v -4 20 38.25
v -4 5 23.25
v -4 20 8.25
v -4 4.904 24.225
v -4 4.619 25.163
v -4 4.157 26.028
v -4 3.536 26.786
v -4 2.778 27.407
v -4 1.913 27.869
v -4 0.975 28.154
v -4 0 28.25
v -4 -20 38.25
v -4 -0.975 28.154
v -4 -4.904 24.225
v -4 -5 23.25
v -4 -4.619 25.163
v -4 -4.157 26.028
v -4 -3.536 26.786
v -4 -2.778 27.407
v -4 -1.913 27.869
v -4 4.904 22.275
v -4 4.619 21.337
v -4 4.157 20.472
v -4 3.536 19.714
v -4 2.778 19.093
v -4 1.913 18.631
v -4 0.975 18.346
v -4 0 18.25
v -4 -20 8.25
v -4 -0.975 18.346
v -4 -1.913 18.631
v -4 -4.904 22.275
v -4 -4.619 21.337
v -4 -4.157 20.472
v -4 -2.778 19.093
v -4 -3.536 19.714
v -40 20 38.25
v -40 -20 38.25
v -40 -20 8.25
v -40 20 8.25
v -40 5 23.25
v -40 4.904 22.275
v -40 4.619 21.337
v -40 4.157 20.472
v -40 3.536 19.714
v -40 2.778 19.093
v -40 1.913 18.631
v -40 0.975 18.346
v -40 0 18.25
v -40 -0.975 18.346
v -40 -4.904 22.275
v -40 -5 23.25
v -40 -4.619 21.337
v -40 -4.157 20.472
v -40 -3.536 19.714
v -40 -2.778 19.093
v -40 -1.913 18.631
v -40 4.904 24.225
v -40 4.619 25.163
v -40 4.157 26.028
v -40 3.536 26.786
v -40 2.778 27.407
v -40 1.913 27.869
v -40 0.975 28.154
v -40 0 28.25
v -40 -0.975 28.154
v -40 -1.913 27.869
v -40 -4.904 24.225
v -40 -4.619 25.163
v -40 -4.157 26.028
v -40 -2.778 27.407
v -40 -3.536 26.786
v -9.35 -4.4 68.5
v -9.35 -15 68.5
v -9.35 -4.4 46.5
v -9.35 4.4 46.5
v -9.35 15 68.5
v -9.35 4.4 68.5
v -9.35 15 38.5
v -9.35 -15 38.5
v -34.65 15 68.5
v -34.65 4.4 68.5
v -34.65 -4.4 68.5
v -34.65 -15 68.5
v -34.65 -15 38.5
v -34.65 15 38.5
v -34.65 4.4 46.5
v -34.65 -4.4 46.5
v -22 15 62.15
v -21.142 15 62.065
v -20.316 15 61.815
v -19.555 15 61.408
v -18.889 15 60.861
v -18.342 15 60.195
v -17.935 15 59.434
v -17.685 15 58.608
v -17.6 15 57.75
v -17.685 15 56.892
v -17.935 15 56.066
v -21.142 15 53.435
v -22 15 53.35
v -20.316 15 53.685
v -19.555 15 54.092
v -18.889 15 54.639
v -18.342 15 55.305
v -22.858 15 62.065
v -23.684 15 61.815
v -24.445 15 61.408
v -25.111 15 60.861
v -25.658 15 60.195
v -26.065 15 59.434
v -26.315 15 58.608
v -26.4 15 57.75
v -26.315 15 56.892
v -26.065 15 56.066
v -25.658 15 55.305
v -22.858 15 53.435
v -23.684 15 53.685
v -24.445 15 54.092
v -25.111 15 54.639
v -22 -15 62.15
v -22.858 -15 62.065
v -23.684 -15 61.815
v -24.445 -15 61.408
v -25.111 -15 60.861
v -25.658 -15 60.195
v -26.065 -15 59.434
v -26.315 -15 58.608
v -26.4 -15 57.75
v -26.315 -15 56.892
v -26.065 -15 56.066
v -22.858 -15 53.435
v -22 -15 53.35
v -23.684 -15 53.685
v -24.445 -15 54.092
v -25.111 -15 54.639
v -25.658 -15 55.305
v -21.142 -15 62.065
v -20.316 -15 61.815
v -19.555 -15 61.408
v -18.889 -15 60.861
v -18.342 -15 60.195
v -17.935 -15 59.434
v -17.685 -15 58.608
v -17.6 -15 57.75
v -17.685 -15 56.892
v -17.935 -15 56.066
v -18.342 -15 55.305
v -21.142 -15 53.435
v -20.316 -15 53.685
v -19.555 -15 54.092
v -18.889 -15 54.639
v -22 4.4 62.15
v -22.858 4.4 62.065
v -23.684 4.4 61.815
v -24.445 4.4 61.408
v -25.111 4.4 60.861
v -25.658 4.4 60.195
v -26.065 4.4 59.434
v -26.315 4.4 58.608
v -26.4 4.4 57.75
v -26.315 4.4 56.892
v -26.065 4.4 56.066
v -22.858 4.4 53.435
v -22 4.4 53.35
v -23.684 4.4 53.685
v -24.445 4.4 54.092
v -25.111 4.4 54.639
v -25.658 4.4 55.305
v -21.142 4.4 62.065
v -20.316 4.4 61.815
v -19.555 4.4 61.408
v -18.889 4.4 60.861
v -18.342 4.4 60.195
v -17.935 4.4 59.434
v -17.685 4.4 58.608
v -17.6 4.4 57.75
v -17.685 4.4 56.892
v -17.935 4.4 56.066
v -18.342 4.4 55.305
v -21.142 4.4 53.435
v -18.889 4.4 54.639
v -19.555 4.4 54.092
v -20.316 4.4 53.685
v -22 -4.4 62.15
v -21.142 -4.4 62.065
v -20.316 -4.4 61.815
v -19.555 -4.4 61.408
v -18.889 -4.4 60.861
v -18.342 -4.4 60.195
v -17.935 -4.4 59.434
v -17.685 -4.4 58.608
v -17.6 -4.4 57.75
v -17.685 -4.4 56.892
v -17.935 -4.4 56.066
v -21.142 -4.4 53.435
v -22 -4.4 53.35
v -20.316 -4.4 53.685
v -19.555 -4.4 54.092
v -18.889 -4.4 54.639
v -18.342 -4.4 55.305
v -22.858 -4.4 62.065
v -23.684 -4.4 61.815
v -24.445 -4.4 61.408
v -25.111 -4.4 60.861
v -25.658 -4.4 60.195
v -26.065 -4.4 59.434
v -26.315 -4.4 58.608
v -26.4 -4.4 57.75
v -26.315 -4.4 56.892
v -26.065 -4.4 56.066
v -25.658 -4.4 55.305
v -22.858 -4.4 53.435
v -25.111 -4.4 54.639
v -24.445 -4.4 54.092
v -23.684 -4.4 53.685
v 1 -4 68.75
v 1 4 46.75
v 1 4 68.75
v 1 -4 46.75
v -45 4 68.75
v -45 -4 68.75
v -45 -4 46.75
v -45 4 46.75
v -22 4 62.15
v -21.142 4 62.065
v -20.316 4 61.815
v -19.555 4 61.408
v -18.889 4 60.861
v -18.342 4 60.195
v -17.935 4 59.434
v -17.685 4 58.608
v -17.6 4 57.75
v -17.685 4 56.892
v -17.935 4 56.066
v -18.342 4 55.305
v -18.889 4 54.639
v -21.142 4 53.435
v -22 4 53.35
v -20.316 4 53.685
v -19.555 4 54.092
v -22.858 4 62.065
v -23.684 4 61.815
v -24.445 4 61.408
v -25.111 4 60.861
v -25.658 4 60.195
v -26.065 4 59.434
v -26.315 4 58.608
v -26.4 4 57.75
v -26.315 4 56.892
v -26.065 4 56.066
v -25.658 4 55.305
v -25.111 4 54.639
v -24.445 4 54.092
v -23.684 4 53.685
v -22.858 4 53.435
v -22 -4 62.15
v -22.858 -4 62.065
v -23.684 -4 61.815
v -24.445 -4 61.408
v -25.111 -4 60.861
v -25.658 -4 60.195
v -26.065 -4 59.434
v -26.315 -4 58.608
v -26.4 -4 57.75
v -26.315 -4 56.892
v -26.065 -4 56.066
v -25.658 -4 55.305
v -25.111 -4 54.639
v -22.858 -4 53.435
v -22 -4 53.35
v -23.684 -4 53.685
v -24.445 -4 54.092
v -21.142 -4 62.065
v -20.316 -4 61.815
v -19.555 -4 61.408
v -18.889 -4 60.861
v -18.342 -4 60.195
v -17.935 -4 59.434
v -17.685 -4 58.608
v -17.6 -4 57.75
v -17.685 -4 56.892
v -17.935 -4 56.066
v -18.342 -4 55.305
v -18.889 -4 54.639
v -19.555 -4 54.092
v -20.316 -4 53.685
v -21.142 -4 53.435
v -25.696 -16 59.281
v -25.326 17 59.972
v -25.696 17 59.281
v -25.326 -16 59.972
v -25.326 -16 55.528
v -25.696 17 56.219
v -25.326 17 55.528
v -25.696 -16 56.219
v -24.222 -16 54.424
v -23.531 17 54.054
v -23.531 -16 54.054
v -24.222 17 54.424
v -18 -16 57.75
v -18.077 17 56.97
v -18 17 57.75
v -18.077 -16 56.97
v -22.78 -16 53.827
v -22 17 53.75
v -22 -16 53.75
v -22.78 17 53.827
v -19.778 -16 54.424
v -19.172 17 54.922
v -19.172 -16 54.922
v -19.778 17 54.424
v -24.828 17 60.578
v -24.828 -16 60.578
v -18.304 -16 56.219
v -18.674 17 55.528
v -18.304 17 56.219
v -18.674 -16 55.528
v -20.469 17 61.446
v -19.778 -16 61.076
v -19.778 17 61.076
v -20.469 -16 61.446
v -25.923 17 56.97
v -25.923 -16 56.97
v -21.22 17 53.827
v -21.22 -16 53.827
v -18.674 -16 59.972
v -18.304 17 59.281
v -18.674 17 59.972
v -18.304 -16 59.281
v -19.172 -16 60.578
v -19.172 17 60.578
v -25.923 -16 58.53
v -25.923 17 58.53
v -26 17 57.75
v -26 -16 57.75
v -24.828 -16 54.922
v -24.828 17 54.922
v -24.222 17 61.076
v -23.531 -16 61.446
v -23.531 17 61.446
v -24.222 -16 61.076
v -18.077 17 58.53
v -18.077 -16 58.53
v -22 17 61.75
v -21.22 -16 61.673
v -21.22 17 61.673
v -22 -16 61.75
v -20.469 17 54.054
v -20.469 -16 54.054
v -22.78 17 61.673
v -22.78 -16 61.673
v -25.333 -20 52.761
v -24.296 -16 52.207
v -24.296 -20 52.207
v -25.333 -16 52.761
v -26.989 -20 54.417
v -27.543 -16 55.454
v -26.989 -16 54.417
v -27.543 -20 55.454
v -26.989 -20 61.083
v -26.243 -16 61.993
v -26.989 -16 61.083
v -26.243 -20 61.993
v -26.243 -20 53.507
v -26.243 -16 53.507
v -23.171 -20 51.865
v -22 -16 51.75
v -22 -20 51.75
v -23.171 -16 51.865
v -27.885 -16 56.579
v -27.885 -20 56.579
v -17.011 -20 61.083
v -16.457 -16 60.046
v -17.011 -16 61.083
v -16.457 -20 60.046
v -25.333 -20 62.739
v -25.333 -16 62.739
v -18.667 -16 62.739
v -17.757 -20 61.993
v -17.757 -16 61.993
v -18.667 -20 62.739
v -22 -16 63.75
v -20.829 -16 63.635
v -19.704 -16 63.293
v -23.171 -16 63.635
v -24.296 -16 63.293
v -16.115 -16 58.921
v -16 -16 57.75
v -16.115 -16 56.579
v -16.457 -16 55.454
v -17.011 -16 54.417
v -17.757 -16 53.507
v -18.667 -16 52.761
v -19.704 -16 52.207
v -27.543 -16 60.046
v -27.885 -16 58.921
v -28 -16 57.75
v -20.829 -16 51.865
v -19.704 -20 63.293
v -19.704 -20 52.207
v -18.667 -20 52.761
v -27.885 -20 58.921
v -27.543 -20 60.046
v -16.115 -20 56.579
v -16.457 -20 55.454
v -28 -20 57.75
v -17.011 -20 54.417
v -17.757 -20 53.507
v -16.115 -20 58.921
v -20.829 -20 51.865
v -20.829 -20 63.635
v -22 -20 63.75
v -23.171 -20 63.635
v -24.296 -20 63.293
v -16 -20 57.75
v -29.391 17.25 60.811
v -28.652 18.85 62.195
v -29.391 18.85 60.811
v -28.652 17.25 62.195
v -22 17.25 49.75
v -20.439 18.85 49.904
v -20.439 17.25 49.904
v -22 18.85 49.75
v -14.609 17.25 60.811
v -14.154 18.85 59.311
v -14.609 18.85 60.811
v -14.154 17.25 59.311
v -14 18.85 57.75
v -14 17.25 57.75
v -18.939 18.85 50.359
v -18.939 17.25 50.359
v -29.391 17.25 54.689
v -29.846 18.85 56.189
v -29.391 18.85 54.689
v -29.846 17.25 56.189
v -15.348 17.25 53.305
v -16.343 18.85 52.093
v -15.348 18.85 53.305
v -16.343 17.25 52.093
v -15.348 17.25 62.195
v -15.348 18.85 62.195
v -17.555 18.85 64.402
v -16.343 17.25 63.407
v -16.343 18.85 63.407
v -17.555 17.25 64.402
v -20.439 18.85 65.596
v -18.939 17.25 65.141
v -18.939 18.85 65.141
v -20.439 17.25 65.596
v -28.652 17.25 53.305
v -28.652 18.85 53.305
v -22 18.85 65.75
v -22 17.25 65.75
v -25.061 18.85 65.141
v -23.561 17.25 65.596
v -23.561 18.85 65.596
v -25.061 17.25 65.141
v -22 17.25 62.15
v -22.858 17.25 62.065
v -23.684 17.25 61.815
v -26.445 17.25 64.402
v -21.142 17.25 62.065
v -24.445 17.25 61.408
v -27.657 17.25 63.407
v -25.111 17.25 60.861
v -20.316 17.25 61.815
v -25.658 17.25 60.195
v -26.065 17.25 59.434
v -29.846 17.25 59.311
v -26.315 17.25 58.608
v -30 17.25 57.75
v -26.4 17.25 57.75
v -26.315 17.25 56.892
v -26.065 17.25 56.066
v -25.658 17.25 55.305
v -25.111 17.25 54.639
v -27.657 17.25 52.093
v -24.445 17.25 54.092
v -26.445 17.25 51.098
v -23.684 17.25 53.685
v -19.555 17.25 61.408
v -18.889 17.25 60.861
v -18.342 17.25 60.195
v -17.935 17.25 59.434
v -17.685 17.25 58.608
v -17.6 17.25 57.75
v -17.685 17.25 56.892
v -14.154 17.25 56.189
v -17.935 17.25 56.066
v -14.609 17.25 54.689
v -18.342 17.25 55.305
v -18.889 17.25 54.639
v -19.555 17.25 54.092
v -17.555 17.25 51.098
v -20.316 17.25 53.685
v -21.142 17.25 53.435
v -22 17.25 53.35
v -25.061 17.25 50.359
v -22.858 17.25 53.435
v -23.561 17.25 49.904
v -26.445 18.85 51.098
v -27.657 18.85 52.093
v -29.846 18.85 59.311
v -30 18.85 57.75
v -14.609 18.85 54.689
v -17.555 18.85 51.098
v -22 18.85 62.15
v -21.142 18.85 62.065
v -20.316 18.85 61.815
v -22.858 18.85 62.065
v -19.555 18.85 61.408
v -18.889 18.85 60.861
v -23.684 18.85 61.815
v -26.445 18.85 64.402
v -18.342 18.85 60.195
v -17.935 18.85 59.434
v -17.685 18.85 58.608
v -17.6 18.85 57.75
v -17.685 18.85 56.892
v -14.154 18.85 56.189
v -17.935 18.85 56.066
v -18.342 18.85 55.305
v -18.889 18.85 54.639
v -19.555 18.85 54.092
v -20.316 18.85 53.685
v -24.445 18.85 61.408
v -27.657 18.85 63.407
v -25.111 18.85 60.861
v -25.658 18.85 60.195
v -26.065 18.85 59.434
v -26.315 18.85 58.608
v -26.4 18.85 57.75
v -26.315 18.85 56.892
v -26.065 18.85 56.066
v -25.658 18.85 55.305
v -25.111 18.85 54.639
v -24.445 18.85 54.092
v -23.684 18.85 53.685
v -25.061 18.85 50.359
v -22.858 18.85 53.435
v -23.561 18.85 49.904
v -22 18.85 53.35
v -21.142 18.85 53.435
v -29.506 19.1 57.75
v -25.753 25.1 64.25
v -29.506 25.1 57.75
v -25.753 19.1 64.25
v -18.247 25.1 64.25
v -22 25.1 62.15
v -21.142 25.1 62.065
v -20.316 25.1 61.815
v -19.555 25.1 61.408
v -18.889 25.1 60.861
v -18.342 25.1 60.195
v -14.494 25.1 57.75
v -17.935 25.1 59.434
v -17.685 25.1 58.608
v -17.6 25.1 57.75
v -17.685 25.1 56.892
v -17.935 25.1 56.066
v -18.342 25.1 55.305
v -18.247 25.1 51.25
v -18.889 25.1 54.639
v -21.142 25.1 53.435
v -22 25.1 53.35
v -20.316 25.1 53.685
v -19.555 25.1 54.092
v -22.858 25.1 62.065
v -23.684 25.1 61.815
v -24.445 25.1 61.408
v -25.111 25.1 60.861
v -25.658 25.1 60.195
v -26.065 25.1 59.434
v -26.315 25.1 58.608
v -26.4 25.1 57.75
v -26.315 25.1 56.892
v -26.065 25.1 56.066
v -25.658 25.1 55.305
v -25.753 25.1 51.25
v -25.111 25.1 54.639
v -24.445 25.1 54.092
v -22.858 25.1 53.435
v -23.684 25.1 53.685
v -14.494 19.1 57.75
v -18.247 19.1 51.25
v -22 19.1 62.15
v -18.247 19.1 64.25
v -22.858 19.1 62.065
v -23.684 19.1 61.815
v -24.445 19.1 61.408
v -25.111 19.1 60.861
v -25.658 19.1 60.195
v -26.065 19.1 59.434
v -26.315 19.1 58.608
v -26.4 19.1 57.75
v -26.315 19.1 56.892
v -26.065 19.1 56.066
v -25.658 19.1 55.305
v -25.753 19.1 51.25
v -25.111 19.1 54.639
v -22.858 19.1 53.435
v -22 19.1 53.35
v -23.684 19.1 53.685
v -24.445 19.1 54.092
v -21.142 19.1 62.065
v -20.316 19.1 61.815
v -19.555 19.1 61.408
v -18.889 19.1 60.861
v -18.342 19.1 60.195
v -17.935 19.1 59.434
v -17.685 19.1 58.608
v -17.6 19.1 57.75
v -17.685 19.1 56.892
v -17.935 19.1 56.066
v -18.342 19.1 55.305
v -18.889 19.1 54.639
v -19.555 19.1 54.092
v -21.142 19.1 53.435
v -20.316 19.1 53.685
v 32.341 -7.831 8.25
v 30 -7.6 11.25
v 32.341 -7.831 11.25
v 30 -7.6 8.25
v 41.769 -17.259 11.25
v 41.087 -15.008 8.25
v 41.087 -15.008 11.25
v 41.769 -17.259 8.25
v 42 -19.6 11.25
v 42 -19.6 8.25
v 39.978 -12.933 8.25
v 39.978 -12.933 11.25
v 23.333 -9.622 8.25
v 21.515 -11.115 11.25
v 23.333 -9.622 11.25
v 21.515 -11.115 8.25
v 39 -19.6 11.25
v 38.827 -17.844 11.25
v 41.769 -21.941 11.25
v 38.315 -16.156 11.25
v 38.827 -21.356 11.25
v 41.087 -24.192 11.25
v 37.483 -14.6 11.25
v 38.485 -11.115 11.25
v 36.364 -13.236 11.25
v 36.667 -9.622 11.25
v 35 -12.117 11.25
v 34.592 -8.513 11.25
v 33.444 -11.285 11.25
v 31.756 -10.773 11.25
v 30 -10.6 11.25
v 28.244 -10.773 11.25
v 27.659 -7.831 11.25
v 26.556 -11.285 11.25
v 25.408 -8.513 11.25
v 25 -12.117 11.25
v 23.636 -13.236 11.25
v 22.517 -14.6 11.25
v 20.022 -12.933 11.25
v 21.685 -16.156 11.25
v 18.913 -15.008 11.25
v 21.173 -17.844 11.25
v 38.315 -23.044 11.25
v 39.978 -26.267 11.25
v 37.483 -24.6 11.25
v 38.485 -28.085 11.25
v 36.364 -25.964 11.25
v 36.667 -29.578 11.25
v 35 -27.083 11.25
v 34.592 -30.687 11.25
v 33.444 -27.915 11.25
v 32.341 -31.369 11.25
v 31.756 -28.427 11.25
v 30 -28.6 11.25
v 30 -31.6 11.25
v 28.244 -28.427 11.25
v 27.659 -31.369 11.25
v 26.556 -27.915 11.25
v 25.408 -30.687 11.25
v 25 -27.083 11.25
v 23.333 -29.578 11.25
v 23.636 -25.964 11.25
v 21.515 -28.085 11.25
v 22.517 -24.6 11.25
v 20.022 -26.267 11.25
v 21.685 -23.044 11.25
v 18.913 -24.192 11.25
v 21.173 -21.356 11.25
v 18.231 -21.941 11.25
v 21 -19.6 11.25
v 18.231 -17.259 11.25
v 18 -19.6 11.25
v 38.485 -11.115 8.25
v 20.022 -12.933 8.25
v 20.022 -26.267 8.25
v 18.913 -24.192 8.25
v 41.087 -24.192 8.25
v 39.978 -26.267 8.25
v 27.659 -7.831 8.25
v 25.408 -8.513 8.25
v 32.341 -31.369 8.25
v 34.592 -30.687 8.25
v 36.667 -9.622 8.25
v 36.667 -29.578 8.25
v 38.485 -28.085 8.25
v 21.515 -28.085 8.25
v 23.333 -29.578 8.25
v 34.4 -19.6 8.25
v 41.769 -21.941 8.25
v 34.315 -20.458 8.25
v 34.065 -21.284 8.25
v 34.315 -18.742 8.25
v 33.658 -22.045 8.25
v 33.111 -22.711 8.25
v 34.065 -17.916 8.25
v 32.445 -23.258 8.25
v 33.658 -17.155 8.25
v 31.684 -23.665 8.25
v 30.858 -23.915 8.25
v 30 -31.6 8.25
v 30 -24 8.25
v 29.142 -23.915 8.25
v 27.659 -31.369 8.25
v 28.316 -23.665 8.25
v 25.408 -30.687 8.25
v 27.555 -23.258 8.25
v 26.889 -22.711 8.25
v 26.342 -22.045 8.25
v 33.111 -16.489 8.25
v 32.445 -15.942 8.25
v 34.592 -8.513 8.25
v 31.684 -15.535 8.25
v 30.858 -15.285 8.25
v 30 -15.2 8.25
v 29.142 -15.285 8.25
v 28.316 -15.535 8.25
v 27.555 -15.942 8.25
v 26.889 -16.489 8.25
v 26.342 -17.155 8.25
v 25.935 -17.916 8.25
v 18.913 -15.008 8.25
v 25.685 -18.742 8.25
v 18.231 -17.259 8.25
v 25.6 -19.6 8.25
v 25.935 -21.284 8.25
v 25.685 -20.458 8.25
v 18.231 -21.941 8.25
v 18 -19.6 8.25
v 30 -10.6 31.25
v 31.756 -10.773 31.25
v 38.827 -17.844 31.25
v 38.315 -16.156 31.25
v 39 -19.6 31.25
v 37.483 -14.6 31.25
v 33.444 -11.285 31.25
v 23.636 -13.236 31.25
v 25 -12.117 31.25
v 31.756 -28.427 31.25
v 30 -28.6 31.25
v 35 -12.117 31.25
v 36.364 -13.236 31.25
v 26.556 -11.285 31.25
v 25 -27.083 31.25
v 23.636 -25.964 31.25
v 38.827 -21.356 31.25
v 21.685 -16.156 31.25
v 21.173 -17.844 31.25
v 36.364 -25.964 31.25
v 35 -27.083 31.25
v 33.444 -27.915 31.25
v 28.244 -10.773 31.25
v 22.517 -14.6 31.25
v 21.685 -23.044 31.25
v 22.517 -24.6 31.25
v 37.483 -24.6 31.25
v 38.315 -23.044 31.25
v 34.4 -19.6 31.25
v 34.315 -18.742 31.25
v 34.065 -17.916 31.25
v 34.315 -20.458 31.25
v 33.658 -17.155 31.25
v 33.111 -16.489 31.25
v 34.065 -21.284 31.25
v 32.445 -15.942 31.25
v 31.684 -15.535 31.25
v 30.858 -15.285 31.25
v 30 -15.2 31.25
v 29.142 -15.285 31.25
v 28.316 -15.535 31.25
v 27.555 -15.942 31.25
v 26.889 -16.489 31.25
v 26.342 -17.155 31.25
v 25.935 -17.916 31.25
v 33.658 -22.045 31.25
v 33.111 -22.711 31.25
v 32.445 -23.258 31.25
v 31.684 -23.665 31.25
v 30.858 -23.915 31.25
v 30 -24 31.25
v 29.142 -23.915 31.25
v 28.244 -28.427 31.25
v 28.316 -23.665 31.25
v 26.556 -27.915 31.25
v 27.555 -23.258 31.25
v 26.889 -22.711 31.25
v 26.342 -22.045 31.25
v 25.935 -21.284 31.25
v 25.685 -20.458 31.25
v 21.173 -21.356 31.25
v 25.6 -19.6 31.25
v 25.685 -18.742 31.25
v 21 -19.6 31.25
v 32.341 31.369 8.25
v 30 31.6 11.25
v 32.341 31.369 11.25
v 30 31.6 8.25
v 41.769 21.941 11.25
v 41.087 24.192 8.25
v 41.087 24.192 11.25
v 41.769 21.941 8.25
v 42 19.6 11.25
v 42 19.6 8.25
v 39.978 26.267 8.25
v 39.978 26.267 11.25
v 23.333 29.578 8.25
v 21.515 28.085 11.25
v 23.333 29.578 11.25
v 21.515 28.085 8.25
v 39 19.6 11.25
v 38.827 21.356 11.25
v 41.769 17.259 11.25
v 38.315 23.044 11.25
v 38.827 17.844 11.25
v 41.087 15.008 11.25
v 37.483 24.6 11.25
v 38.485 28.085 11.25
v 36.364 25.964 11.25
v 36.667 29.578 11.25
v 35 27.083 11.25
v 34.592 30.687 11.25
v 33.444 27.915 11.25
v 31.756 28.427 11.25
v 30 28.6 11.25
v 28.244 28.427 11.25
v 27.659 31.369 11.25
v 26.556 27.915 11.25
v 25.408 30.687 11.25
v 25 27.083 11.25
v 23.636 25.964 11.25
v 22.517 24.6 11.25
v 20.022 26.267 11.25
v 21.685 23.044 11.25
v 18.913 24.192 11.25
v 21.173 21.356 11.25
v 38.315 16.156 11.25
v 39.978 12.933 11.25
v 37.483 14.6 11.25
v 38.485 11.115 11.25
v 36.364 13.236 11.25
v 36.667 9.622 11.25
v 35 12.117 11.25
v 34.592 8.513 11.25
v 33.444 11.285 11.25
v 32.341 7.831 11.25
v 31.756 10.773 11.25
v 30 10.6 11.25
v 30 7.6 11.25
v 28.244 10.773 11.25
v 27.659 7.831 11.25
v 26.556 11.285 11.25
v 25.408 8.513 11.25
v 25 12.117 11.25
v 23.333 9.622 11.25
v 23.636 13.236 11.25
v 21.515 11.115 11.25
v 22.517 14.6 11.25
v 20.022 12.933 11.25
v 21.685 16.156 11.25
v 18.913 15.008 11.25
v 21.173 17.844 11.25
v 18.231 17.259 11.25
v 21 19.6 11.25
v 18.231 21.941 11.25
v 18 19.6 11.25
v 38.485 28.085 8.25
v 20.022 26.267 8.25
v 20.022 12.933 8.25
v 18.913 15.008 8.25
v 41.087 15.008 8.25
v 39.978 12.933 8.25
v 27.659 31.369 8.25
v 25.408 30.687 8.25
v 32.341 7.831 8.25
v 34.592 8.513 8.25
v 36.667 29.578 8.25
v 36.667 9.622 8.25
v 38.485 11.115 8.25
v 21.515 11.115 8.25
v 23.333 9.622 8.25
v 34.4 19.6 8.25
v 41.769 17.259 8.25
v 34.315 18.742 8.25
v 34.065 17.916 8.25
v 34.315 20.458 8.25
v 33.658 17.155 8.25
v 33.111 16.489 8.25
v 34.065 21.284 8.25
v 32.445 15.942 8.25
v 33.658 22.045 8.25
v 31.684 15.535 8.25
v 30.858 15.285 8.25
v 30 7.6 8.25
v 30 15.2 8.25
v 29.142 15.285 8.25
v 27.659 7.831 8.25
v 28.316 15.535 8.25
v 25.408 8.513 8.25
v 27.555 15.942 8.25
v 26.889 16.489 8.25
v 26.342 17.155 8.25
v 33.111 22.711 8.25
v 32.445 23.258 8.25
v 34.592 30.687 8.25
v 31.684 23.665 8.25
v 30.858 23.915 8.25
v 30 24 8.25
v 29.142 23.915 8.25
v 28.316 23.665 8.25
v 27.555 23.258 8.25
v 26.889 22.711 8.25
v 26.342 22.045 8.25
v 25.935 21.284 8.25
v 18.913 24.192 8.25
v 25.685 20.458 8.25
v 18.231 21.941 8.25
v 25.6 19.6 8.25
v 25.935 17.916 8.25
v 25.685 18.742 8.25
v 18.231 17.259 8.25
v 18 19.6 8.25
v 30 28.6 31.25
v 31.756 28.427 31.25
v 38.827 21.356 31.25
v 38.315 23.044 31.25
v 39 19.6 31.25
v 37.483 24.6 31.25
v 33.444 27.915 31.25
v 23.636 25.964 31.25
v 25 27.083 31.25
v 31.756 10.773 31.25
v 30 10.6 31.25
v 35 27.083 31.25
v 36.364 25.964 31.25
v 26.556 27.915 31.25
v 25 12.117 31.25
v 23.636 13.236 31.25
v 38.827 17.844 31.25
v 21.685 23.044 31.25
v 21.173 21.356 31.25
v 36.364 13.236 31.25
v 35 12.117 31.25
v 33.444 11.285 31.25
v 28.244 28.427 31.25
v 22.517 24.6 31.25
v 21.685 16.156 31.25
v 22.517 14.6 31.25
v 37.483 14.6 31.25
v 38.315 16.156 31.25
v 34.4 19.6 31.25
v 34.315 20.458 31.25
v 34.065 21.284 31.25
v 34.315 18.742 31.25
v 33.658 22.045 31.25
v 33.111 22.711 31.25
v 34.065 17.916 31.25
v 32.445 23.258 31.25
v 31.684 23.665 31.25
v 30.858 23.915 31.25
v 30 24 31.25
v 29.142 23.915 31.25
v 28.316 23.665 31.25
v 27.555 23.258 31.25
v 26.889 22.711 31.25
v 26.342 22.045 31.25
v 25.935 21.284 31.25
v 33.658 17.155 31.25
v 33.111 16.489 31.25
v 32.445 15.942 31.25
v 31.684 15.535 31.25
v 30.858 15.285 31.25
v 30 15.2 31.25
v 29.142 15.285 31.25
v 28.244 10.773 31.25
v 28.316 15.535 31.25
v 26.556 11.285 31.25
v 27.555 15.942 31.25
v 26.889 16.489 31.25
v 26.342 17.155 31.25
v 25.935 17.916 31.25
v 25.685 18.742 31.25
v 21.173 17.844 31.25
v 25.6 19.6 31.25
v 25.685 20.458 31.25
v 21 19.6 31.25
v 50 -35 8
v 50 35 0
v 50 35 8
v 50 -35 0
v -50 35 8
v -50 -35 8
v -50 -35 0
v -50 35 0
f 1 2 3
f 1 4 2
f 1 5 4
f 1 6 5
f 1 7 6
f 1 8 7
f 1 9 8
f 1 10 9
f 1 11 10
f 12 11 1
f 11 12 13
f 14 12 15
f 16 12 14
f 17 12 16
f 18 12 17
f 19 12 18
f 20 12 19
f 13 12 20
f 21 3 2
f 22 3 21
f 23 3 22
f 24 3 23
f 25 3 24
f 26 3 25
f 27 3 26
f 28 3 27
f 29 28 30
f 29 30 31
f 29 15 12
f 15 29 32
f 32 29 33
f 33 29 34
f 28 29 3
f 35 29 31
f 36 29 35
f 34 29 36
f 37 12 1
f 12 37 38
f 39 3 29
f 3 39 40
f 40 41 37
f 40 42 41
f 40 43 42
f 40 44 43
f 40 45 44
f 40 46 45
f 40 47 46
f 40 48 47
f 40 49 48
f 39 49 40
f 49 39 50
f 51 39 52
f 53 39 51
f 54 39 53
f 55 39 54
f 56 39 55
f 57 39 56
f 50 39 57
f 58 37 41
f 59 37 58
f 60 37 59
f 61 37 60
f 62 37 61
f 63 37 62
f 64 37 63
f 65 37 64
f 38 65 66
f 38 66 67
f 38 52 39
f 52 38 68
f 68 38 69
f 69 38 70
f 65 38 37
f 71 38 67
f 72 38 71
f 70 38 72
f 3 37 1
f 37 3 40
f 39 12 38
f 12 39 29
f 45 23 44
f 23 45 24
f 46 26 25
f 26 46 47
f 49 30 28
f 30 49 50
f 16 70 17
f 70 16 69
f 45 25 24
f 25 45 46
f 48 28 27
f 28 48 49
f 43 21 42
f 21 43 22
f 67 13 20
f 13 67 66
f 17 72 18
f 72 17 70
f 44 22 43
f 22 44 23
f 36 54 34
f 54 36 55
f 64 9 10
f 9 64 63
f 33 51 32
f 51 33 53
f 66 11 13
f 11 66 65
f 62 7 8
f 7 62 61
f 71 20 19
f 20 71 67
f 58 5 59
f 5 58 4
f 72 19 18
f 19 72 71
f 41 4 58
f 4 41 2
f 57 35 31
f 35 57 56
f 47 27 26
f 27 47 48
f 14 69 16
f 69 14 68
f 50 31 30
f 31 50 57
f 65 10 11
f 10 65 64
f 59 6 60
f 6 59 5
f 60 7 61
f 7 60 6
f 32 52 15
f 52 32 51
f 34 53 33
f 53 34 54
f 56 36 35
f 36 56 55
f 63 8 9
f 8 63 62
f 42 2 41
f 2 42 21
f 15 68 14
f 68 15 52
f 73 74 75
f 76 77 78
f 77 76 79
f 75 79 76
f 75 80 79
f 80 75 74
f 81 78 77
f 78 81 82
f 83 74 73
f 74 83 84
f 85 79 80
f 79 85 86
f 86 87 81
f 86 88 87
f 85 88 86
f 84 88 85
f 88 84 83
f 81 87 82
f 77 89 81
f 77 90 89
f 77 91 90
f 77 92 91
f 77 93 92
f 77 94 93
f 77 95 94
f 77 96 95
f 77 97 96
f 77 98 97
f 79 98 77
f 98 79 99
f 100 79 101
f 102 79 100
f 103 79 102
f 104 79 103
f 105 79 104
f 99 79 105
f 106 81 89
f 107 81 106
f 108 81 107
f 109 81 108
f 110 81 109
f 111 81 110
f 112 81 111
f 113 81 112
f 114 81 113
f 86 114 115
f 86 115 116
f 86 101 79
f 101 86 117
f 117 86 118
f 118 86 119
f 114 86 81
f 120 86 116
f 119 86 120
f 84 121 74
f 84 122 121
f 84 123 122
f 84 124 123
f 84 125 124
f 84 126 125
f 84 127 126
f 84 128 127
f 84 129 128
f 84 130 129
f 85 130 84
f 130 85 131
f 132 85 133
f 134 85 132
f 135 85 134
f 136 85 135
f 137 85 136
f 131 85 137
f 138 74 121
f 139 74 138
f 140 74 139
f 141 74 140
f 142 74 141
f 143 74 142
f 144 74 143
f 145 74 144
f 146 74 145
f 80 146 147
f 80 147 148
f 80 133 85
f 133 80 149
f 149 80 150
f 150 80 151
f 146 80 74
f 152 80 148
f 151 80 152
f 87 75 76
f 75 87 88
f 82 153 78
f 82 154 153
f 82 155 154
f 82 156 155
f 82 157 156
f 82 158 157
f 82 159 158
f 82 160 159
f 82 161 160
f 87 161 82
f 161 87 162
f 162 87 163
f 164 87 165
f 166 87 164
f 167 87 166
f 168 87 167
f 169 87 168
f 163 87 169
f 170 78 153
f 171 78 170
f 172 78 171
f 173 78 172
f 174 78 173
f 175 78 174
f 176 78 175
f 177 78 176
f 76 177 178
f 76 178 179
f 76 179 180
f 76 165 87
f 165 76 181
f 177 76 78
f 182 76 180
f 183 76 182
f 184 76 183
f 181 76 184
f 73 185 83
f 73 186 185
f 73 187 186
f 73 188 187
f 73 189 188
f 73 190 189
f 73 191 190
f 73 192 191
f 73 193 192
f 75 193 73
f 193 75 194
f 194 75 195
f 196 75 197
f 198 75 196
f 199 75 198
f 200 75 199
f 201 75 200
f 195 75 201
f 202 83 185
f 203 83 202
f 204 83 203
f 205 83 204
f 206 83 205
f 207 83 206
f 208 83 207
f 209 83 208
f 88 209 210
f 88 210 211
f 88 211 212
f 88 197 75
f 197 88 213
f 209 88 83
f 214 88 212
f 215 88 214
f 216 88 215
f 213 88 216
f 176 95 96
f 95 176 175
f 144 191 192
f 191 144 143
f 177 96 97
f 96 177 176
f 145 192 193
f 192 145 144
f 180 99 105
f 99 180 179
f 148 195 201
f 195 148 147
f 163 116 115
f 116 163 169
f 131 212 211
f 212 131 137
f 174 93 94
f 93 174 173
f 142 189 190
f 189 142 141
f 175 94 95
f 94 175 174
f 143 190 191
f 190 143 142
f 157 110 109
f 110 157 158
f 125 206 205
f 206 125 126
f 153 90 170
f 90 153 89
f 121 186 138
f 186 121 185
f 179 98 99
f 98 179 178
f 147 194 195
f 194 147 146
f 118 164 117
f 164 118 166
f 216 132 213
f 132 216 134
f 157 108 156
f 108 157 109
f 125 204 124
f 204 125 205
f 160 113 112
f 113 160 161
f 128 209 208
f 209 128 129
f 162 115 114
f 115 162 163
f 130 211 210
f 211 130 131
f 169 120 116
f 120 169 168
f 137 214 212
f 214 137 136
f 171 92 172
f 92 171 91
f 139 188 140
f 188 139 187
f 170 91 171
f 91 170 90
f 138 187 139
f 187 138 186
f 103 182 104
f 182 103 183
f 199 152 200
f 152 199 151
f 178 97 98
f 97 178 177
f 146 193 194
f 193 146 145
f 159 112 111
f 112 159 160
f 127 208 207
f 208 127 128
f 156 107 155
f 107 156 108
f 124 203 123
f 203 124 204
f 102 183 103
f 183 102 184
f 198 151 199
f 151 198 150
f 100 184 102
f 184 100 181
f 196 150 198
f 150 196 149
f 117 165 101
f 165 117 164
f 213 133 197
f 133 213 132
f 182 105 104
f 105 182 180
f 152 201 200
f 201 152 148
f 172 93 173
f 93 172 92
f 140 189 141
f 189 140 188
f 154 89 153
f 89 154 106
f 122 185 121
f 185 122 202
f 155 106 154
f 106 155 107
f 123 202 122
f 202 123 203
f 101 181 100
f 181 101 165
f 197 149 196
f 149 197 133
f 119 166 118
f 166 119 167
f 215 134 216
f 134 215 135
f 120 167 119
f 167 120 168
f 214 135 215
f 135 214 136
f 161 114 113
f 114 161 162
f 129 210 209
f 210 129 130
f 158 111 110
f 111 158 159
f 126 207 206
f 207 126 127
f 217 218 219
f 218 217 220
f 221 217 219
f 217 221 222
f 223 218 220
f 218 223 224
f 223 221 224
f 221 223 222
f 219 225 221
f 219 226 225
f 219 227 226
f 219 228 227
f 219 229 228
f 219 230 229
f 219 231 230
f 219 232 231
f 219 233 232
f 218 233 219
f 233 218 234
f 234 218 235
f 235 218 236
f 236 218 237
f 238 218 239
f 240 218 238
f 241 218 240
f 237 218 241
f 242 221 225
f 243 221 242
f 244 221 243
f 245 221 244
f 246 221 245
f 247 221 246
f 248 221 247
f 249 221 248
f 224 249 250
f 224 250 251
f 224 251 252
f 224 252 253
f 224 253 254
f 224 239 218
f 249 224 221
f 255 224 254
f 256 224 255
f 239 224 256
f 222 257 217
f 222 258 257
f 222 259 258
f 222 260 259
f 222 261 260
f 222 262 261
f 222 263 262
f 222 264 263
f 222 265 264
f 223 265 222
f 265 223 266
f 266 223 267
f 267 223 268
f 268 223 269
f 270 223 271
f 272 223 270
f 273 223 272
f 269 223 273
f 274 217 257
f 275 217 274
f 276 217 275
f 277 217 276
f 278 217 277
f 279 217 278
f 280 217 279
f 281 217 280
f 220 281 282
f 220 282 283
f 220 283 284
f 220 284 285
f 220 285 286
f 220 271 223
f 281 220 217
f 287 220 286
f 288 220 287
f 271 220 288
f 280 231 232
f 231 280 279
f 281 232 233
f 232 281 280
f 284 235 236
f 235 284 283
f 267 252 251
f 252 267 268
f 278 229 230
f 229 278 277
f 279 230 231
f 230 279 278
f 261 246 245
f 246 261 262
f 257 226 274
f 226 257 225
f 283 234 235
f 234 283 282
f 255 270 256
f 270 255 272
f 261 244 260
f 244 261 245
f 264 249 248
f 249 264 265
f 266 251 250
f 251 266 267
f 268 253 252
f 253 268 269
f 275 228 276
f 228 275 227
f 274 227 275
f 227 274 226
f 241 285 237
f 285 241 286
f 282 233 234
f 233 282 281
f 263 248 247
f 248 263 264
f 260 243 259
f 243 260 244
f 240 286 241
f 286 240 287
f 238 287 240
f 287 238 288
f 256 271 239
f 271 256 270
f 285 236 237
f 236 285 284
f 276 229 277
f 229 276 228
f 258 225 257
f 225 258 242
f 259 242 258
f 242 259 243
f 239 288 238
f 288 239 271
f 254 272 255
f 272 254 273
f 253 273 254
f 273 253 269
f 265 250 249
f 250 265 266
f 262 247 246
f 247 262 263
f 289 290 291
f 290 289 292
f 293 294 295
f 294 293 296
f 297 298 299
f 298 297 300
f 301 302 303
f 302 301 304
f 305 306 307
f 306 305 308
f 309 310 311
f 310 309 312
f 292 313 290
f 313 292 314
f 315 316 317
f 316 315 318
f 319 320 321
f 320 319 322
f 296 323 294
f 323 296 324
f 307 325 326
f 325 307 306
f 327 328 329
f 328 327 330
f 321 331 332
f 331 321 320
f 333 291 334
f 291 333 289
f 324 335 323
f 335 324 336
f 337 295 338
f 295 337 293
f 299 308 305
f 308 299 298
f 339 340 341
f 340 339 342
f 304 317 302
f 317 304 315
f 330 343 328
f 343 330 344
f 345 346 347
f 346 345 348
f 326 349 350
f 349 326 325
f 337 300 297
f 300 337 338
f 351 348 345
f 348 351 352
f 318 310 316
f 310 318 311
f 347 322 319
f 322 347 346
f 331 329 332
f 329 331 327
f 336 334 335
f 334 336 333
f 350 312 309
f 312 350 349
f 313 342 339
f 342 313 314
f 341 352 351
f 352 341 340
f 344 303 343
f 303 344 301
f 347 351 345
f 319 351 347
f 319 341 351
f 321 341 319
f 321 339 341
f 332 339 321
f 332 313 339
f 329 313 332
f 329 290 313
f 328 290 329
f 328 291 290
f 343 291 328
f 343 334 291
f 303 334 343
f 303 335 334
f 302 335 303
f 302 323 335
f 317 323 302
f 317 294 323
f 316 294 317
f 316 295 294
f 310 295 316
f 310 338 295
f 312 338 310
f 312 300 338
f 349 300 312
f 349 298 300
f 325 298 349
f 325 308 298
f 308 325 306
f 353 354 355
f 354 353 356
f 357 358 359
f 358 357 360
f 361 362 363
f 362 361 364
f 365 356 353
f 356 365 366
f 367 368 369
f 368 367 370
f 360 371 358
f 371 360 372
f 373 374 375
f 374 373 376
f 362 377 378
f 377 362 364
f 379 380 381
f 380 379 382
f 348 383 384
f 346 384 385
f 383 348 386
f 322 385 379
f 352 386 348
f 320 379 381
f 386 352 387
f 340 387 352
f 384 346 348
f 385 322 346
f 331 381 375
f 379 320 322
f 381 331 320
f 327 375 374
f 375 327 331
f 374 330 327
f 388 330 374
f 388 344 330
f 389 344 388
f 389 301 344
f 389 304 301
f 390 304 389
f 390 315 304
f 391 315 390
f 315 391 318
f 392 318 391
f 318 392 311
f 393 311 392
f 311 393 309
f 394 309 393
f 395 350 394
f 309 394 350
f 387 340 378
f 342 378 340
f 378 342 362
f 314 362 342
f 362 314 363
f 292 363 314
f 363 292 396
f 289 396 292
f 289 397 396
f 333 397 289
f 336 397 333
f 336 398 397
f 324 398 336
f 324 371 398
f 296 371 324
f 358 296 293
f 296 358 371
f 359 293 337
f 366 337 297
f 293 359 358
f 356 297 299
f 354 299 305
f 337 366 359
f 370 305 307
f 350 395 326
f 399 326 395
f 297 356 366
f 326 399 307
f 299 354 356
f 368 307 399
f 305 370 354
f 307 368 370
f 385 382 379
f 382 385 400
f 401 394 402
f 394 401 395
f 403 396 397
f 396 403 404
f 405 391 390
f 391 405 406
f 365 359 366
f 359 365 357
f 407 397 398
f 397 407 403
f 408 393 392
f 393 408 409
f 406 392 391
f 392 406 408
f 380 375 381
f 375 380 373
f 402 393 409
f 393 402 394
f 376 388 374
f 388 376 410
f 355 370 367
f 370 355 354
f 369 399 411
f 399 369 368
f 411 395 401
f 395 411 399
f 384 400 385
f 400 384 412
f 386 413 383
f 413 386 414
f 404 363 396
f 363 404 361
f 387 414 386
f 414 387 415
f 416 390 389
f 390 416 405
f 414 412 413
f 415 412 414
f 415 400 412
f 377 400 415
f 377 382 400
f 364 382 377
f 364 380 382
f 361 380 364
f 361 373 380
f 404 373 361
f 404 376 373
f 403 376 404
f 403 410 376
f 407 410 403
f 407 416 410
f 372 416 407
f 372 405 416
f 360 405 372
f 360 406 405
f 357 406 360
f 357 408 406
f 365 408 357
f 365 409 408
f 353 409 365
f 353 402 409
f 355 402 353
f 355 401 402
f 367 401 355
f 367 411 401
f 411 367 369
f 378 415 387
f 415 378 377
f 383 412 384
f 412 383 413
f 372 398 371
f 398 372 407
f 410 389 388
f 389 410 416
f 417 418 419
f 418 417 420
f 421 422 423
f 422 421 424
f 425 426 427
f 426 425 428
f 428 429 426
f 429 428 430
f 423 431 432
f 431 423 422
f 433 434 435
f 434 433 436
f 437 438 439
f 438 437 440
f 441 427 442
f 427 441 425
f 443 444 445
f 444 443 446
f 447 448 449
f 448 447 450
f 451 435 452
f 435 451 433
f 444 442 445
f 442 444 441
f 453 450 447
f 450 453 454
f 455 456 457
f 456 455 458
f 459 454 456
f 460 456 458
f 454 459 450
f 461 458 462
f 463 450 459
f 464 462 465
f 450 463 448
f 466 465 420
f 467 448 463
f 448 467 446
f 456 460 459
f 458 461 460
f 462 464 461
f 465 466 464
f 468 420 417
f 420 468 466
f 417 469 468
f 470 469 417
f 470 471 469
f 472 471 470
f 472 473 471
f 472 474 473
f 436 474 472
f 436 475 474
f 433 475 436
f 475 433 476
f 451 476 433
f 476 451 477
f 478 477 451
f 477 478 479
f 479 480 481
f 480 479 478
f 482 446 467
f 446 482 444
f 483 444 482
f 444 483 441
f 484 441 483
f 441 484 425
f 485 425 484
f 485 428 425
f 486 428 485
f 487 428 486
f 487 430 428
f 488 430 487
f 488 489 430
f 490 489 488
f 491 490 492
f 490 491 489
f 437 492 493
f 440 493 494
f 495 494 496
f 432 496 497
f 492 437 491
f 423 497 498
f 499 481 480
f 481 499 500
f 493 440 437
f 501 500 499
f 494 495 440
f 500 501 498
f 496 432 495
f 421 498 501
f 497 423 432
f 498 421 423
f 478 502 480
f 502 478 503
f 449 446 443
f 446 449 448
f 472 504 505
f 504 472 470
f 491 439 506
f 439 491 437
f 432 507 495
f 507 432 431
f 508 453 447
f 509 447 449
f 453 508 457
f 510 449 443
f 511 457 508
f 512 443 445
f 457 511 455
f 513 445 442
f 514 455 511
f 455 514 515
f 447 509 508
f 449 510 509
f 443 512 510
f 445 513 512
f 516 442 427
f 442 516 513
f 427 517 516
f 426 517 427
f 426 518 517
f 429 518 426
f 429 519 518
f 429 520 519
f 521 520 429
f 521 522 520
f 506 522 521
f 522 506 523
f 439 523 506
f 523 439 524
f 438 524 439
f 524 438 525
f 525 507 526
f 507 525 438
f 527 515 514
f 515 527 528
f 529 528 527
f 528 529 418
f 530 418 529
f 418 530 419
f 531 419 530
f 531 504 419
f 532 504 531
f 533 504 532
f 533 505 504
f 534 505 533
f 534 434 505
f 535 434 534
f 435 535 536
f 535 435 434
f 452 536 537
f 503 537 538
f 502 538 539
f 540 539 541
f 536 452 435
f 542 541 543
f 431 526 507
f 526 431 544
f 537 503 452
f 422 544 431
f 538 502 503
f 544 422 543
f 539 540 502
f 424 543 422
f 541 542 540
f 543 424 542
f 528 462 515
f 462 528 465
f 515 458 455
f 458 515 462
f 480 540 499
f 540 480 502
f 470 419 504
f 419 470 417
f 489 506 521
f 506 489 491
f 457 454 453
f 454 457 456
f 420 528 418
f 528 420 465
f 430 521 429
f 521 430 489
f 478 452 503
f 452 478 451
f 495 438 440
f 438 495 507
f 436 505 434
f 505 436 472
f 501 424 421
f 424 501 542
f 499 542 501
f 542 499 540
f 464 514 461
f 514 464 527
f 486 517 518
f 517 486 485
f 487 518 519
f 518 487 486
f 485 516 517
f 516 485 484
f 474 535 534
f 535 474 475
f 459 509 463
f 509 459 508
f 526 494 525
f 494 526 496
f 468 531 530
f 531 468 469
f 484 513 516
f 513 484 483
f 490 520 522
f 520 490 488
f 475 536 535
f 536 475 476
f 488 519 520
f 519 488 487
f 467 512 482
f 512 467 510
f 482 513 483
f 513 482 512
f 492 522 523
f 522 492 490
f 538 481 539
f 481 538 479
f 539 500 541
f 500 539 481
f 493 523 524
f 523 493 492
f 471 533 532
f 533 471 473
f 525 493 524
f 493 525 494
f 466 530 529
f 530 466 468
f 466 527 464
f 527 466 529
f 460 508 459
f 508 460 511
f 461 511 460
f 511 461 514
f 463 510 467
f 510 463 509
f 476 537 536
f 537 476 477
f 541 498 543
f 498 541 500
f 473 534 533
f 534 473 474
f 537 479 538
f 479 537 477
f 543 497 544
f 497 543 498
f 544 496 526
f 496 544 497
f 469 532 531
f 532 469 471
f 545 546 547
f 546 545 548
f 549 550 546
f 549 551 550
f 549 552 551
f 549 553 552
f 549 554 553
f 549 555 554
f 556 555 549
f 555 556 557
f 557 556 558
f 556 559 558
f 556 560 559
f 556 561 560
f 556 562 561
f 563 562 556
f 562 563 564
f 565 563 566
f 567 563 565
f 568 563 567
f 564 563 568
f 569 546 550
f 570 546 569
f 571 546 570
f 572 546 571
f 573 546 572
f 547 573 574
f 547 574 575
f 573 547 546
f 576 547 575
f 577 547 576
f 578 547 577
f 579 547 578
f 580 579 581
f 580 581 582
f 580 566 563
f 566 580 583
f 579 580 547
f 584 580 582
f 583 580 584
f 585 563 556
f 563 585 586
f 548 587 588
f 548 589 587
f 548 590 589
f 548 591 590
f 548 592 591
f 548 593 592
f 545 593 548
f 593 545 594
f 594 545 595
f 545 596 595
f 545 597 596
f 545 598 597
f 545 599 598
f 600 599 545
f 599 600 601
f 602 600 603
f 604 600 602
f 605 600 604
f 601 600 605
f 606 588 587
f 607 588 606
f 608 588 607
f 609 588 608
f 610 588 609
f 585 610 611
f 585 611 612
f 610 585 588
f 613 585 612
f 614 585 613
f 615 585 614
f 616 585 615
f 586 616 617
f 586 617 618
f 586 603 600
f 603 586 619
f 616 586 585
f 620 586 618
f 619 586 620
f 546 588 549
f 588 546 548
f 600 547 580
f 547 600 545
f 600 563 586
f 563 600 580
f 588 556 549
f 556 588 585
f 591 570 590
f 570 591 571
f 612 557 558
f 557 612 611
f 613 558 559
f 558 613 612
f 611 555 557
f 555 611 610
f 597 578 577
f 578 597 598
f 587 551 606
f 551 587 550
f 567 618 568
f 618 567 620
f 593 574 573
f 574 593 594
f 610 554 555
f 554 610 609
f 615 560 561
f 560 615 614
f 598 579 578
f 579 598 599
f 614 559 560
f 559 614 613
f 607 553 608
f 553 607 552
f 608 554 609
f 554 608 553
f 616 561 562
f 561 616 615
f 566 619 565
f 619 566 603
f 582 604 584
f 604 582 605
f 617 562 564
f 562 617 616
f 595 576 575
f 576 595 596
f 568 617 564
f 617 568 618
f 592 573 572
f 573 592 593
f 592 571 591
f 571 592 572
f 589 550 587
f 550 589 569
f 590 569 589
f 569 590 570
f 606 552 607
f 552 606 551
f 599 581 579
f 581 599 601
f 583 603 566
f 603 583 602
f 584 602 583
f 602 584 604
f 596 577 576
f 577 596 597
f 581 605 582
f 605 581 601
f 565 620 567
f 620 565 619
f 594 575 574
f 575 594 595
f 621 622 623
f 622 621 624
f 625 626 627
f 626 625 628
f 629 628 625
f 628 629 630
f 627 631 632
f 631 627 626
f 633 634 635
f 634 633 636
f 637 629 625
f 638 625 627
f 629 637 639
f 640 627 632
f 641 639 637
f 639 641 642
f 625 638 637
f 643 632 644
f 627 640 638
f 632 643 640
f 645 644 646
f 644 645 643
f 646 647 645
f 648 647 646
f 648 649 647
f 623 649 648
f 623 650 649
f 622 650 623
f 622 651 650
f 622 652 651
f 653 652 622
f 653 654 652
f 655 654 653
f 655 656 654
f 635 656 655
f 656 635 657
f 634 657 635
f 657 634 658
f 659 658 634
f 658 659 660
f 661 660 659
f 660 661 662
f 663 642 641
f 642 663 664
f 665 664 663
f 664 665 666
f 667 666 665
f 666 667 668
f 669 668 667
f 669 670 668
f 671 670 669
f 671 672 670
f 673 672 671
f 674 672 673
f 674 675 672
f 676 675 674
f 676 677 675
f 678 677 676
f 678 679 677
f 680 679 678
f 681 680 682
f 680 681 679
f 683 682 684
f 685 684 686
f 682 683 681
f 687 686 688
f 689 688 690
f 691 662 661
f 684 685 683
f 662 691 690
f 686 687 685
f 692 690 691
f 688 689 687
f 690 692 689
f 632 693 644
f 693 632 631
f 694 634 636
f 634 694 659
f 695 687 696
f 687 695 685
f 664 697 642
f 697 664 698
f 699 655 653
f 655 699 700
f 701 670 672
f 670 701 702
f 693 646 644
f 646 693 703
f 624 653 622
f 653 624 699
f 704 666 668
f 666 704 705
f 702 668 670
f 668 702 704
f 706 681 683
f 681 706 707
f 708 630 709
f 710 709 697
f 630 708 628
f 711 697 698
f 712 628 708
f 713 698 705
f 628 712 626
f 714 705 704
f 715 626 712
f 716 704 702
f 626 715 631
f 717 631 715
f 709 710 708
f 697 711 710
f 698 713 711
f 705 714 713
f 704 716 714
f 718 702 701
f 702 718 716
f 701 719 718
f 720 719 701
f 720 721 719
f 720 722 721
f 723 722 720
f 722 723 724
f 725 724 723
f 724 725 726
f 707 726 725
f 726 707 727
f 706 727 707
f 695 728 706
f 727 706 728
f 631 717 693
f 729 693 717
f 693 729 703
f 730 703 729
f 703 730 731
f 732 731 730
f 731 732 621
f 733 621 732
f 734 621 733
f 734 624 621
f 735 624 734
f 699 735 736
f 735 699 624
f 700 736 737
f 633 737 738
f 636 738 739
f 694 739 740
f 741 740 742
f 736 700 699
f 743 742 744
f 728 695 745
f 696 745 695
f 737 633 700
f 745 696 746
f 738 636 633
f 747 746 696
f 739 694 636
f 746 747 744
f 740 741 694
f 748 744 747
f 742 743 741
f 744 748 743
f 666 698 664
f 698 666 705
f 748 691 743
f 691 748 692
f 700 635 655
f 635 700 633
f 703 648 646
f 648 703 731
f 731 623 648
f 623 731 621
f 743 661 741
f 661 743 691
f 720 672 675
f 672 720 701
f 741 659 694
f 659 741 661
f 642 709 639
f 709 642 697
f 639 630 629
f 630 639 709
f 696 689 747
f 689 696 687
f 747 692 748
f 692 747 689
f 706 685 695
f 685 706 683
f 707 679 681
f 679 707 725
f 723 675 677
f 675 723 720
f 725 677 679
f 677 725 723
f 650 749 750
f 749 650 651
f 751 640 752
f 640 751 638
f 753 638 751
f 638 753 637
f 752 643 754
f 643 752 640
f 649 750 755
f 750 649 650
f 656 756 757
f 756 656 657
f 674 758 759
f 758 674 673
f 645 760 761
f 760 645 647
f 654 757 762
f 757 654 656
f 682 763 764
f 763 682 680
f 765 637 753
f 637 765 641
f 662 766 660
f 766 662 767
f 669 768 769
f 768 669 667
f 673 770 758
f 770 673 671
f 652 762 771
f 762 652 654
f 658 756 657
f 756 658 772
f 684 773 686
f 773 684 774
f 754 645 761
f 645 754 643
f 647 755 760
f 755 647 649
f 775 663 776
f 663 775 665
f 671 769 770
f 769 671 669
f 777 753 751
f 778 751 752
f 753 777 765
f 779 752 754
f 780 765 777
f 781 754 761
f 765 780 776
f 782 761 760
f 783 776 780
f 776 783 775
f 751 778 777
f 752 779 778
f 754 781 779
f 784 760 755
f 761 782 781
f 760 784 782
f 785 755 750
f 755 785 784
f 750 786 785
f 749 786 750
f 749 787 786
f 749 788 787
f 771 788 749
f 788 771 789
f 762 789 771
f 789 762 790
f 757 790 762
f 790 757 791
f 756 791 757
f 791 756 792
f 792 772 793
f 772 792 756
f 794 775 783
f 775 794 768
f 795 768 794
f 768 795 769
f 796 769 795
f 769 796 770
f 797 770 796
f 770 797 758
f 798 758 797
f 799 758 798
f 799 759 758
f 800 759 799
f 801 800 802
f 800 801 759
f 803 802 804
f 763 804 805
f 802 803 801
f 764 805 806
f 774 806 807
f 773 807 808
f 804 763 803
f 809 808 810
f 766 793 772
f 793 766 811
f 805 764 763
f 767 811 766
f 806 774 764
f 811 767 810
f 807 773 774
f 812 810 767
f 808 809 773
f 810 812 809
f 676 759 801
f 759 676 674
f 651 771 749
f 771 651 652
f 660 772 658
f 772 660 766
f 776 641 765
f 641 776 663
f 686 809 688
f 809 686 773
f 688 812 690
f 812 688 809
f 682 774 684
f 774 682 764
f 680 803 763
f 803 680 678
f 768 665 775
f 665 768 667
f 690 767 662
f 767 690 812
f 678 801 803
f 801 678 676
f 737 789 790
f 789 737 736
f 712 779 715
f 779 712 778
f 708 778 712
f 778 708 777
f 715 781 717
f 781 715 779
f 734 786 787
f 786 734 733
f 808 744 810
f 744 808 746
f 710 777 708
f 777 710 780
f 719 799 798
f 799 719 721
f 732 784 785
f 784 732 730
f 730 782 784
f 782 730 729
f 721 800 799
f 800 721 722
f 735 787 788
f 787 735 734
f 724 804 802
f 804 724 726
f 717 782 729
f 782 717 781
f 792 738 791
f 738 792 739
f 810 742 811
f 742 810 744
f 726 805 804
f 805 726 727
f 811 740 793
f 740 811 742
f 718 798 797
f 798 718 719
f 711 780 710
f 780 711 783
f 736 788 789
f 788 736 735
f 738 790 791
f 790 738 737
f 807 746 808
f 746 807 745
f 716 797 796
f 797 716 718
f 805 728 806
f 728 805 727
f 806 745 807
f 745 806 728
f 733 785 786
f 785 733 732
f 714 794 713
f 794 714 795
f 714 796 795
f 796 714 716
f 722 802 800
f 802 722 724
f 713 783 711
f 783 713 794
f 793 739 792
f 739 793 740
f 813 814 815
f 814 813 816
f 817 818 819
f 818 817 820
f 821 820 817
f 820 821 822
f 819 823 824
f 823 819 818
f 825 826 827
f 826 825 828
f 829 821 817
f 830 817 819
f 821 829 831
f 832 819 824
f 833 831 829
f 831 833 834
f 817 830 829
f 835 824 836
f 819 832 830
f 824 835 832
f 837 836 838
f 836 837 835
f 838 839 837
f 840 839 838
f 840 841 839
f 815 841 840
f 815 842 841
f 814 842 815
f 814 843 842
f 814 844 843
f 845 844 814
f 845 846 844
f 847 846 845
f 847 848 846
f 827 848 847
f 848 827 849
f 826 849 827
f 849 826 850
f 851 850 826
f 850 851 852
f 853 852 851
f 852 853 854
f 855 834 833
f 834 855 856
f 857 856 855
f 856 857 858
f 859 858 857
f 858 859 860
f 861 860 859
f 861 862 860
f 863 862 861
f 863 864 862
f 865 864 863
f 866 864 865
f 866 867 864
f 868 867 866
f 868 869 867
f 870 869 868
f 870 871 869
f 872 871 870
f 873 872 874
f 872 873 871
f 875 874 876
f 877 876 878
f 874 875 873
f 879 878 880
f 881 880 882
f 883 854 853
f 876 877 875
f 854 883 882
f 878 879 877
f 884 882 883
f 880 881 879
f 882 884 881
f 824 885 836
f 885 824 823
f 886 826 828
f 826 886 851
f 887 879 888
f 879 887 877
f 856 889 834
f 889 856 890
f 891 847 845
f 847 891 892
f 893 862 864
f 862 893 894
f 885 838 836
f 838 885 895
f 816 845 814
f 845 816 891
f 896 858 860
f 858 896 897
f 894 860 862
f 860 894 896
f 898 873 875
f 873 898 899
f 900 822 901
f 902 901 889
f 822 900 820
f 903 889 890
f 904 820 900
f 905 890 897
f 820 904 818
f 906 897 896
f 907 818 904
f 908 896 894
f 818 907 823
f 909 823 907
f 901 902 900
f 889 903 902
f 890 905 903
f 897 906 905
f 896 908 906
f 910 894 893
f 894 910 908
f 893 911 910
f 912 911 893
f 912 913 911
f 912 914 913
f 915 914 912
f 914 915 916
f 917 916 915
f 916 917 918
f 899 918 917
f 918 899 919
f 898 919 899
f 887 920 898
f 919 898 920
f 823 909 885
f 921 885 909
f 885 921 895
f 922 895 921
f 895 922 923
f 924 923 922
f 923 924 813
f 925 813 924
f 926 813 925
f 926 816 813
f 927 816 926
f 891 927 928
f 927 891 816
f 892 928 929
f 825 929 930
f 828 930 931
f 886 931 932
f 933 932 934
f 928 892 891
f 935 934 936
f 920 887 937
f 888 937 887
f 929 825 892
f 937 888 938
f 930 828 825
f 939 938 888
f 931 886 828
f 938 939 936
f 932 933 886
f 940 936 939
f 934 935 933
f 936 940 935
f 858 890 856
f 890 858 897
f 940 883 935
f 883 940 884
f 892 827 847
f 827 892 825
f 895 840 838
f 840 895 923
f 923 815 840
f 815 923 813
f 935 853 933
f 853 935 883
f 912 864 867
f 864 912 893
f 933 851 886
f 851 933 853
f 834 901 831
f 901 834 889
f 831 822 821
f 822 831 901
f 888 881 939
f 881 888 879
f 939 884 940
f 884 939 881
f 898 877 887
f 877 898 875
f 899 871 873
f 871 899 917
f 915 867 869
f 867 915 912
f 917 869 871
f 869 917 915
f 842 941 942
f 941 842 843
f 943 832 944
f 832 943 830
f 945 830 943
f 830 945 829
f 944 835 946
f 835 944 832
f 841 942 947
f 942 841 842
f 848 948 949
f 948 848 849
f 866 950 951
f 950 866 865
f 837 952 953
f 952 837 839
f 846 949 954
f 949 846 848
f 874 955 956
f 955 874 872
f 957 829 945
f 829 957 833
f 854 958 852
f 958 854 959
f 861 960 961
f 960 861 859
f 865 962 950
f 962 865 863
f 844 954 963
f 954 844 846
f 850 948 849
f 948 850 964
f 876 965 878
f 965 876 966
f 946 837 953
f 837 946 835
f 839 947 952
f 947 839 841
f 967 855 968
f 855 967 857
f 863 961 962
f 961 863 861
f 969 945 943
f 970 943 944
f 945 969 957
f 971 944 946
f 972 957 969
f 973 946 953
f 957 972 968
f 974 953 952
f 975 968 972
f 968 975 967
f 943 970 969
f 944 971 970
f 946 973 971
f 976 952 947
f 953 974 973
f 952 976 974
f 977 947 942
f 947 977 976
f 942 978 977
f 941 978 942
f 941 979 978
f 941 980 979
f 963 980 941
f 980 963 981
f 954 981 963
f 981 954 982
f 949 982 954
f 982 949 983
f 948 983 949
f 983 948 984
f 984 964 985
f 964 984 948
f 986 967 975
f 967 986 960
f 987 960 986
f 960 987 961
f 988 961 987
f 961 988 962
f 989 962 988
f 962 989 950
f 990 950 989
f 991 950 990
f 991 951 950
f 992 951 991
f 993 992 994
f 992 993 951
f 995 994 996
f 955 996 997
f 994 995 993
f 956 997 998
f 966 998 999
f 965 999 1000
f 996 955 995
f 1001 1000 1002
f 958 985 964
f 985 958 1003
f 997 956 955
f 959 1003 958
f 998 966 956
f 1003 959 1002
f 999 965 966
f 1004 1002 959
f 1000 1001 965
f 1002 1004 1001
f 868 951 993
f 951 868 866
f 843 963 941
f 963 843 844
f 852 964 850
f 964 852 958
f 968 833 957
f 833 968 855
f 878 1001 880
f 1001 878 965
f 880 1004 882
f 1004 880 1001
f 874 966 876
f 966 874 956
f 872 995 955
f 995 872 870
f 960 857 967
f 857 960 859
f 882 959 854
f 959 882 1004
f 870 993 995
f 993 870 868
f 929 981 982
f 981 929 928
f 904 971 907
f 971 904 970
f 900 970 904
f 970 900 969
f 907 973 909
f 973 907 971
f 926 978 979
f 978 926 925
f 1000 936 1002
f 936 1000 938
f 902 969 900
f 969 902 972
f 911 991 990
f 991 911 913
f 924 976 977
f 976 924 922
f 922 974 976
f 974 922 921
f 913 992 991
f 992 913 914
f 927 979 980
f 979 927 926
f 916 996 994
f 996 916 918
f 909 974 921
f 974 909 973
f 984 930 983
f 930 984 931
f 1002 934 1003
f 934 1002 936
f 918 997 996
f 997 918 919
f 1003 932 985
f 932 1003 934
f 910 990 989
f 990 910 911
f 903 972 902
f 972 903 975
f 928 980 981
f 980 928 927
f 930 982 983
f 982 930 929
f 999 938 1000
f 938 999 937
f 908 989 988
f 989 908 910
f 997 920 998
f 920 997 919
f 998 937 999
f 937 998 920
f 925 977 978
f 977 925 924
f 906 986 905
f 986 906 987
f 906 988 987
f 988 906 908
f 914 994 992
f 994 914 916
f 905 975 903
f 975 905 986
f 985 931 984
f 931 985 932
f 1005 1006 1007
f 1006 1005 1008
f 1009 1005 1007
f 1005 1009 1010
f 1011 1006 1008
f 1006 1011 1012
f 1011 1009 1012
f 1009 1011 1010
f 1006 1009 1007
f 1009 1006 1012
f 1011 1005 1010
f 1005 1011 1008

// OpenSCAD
$fn = 32;

// ------------------------------------------------------------------------
// Indexing jig: plate 100 x 70 mm, pin d8
// Every part is its own module, assembly() places every instance.
// ------------------------------------------------------------------------

// --- part 1 ---
module jig_plate() {
  difference() {
    translate([-50, -35, 0]) cube([100, 70, 8]);
  }
}

// --- part 2 ---
module locator_block() {
  difference() {
    translate([-18, -20, 0]) cube([36, 40, 30]);
    translate([0, 0, 15]) rotate([0, 90, 0]) cylinder(h = 38, d = 10, center = true);
  }
}

// --- part 3 ---
module index_fork() {
  difference() {
    translate([-12.65, -15, 0]) cube([25.3, 30, 30]);
    translate([-13.65, -4.4, 8]) cube([27.3, 8.8, 23]);
    translate([0, 0, 19.25]) rotate([90, 0, 0]) cylinder(h = 32, d = 8.8, center = true);
  }
}

// --- part 4 ---
module index_arm() {
  difference() {
    translate([-23, -4, 0]) cube([46, 8, 22]);
    translate([0, 0, 11]) rotate([90, 0, 0]) cylinder(h = 10, d = 8.8, center = true);
  }
}

// --- part 5 ---
module index_pin() {
  rotate([0, 90, 0]) cylinder(h = 34, d = 8, center = true);
  translate([-20, 0, 0]) rotate([0, 90, 0]) cylinder(h = 4, d = 12);
}

// --- part 6 ---
module pin_washer() {
  difference() {
      translate([0, 0, 0]) cylinder(h = 1.6, d = 16);
      translate([0, 0, -1]) cylinder(h = 3.6, d = 8.8);
    }
}

// --- part 7 ---
module lock_nut() {
  difference() {
    linear_extrude(height = 6) polygon(points = [[7.506, 0], [3.753, 6.5], [-3.753, 6.5], [-7.506, 0], [-3.753, -6.5], [3.753, -6.5]]);
    translate([0, 0, -1]) cylinder(h = 8, d = 8.8);
  }
}

// --- part 8 ---
module guide_bush_a() {
  difference() {
    union() {
      cylinder(h = 3, d = 24);
      translate([0, 0, 3]) cylinder(h = 20, d = 18);
    }
    translate([0, 0, -1]) cylinder(h = 25, d = 8.8);
  }
}

// --- part 9 ---
module guide_bush_b() {
  difference() {
    union() {
      cylinder(h = 3, d = 24);
      translate([0, 0, 3]) cylinder(h = 20, d = 18);
    }
    translate([0, 0, -1]) cylinder(h = 25, d = 8.8);
  }
}

// --- assembly ---
module assembly() {
  color([0.80, 0.24, 0.20]) translate([0, 0, 0]) rotate([0, 0, 0]) jig_plate();
  color([0.20, 0.45, 0.75]) translate([-22, 0, 8.25]) rotate([0, 0, 0]) locator_block();
  color([0.25, 0.62, 0.32]) translate([-22, 0, 38.5]) rotate([0, 0, 0]) index_fork();
  color([0.92, 0.70, 0.18]) translate([-22, 0, 46.75]) rotate([0, 0, 0]) index_arm();
  color([0.58, 0.35, 0.70]) translate([-22, 0, 57.75]) rotate([0, 0, 90]) index_pin();
  color([0.16, 0.66, 0.66]) translate([-22, 18.85, 57.75]) rotate([90, 0, 0]) pin_washer();
  color([0.85, 0.48, 0.18]) translate([-22, 25.1, 57.75]) rotate([90, 0, 0]) lock_nut();
  color([0.55, 0.60, 0.65]) translate([30, -19.6, 8.25]) rotate([0, 0, 0]) guide_bush_a();
  color([0.75, 0.30, 0.55]) translate([30, 19.6, 8.25]) rotate([0, 0, 0]) guide_bush_b();
}

assembly();
